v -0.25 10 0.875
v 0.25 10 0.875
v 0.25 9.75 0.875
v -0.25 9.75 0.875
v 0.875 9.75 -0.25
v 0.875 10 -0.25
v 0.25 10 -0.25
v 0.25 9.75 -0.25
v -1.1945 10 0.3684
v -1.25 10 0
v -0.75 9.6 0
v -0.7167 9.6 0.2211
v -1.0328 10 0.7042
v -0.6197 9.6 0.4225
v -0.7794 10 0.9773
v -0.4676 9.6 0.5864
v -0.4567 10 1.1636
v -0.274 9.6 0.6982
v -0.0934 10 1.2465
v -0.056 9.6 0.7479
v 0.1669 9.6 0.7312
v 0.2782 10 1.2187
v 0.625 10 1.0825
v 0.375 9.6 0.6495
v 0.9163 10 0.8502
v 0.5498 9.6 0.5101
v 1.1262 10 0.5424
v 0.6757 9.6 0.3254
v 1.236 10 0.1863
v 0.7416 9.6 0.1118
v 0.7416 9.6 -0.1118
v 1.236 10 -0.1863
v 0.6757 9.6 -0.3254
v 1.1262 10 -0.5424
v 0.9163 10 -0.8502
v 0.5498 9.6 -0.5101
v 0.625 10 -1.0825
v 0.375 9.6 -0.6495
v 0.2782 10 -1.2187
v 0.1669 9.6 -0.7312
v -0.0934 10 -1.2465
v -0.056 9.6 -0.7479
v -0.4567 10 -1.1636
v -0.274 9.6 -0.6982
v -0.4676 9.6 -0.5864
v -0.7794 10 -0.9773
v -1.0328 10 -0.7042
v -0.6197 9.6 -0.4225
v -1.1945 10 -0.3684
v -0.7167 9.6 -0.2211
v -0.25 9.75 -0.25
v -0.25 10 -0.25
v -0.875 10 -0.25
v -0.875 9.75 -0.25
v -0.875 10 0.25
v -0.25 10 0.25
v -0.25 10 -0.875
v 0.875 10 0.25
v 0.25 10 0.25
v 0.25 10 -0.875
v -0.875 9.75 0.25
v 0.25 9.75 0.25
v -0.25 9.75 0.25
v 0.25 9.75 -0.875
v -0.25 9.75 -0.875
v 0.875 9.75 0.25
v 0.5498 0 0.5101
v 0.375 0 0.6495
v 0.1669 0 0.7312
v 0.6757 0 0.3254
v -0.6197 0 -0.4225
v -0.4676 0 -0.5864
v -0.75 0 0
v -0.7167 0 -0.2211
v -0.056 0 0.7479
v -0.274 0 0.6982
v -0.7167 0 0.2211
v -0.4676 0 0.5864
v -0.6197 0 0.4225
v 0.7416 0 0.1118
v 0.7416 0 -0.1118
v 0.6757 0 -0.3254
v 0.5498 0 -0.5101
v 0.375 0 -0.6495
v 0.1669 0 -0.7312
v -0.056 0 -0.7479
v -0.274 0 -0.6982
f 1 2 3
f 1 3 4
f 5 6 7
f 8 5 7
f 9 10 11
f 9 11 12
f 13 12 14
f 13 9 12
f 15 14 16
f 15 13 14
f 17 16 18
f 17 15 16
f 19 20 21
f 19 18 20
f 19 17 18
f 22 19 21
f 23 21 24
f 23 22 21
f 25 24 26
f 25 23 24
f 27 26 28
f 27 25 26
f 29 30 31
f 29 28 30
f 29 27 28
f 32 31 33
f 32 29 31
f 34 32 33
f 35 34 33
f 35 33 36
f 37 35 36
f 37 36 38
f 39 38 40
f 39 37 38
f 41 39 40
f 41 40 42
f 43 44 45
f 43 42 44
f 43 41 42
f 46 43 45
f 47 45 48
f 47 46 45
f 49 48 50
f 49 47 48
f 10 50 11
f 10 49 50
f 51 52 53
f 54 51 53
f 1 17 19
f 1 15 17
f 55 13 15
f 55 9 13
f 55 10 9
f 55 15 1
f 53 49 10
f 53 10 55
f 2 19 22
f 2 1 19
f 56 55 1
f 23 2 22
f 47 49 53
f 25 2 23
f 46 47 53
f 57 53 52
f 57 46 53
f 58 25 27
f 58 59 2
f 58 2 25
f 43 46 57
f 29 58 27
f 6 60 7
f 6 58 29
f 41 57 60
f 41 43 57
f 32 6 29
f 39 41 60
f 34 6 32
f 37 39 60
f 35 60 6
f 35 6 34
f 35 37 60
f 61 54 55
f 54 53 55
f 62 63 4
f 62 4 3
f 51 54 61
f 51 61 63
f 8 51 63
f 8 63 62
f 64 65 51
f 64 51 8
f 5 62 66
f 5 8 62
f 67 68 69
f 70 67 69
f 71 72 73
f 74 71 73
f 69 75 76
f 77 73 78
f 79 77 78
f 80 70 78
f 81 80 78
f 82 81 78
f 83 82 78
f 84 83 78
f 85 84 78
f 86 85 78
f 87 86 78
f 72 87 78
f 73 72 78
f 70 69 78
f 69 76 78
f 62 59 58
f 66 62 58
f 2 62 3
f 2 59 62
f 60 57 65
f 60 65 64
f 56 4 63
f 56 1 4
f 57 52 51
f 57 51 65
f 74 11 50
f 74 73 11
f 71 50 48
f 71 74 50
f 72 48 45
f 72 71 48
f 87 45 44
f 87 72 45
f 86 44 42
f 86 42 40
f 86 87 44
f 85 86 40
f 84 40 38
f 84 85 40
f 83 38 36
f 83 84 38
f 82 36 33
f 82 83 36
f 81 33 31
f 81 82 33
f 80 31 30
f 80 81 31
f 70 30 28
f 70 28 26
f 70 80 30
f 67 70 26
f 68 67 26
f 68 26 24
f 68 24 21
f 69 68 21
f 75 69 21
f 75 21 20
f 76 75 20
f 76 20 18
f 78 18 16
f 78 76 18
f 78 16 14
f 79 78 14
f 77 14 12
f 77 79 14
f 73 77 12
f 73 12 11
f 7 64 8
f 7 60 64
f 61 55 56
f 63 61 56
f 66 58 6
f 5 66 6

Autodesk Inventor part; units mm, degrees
ref_plane "YZ Plane" through (0, 0, 0) normal (1, 0, 0) x (0, 1, 0)
ref_plane "XZ Plane" through (0, 0, 0) normal (0, 1, 0) x (-1, 0, 0)
sketch "Esboço1" plane through (0, 0, 0) normal (0, 1, 0) x (-1, 0, 0)
  circle A0 centre (0, 0) radius 0.75
  dimension "d1" = 1.5
extrude "Extrusão1" add sketch "Esboço1" along normal blind 9.6
ref_plane "Plano de trabalho1" through (0, 10, 0) normal (0, 1, 0) x (1, 0, 0)
sketch "Esboço2" plane through (0, 10, 0) normal (0, 1, 0) x (1, 0, 0)
  circle A0 centre (0, 0) radius 1.25
  dimension "d5" = 2.5
loft "Transição1" add profiles "Esboço2" section 1 edges at (0.75, 9.6, 0)
sketch "Esboço3" plane through (0, 10, 0) normal (0, 1, 0) x (1, 0, 0)
  line L0 (0.25, -0.875) -> (-0.25, -0.875)
  line L1 (-0.25, -0.875) -> (-0.25, 0.875)
  line L2 (-0.25, 0.875) -> (0.25, 0.875)
  line L3 (0.25, 0.875) -> (0.25, -0.875)
  line L4 (0.25, -0.875) -> (-0.25, 0.875) construction
  line L5 (-0.25, -0.875) -> (0.25, 0.875) construction
  line L6 (-0.875, -0.25) -> (0.875, -0.25)
  line L7 (0.875, -0.25) -> (0.875, 0.25)
  line L8 (0.875, 0.25) -> (-0.875, 0.25)
  line L9 (-0.875, 0.25) -> (-0.875, -0.25)
  line L10 (-0.875, -0.25) -> (0.875, 0.25) construction
  line L11 (0.875, -0.25) -> (-0.875, 0.25) construction
  point P0 (0, 0)
  point P1 (-0.25, 0.25)
  point P2 (-0.25, -0.25)
  point P3 (0.25, -0.25)
  point P4 (0.25, 0.25)
  dimension "d10" = 0.5
  dimension "d11" = 1.75
  dimension "d14" = 1.75
  dimension "d15" = 0.5
extrude "Extrusão2" cut sketch "Esboço3" against normal blind 0.25
thread "Rosca1" size "M1.6x0.35" class "6g" standard "ANSI Metric M Profile" length 5
properties part number "Parafuso"
